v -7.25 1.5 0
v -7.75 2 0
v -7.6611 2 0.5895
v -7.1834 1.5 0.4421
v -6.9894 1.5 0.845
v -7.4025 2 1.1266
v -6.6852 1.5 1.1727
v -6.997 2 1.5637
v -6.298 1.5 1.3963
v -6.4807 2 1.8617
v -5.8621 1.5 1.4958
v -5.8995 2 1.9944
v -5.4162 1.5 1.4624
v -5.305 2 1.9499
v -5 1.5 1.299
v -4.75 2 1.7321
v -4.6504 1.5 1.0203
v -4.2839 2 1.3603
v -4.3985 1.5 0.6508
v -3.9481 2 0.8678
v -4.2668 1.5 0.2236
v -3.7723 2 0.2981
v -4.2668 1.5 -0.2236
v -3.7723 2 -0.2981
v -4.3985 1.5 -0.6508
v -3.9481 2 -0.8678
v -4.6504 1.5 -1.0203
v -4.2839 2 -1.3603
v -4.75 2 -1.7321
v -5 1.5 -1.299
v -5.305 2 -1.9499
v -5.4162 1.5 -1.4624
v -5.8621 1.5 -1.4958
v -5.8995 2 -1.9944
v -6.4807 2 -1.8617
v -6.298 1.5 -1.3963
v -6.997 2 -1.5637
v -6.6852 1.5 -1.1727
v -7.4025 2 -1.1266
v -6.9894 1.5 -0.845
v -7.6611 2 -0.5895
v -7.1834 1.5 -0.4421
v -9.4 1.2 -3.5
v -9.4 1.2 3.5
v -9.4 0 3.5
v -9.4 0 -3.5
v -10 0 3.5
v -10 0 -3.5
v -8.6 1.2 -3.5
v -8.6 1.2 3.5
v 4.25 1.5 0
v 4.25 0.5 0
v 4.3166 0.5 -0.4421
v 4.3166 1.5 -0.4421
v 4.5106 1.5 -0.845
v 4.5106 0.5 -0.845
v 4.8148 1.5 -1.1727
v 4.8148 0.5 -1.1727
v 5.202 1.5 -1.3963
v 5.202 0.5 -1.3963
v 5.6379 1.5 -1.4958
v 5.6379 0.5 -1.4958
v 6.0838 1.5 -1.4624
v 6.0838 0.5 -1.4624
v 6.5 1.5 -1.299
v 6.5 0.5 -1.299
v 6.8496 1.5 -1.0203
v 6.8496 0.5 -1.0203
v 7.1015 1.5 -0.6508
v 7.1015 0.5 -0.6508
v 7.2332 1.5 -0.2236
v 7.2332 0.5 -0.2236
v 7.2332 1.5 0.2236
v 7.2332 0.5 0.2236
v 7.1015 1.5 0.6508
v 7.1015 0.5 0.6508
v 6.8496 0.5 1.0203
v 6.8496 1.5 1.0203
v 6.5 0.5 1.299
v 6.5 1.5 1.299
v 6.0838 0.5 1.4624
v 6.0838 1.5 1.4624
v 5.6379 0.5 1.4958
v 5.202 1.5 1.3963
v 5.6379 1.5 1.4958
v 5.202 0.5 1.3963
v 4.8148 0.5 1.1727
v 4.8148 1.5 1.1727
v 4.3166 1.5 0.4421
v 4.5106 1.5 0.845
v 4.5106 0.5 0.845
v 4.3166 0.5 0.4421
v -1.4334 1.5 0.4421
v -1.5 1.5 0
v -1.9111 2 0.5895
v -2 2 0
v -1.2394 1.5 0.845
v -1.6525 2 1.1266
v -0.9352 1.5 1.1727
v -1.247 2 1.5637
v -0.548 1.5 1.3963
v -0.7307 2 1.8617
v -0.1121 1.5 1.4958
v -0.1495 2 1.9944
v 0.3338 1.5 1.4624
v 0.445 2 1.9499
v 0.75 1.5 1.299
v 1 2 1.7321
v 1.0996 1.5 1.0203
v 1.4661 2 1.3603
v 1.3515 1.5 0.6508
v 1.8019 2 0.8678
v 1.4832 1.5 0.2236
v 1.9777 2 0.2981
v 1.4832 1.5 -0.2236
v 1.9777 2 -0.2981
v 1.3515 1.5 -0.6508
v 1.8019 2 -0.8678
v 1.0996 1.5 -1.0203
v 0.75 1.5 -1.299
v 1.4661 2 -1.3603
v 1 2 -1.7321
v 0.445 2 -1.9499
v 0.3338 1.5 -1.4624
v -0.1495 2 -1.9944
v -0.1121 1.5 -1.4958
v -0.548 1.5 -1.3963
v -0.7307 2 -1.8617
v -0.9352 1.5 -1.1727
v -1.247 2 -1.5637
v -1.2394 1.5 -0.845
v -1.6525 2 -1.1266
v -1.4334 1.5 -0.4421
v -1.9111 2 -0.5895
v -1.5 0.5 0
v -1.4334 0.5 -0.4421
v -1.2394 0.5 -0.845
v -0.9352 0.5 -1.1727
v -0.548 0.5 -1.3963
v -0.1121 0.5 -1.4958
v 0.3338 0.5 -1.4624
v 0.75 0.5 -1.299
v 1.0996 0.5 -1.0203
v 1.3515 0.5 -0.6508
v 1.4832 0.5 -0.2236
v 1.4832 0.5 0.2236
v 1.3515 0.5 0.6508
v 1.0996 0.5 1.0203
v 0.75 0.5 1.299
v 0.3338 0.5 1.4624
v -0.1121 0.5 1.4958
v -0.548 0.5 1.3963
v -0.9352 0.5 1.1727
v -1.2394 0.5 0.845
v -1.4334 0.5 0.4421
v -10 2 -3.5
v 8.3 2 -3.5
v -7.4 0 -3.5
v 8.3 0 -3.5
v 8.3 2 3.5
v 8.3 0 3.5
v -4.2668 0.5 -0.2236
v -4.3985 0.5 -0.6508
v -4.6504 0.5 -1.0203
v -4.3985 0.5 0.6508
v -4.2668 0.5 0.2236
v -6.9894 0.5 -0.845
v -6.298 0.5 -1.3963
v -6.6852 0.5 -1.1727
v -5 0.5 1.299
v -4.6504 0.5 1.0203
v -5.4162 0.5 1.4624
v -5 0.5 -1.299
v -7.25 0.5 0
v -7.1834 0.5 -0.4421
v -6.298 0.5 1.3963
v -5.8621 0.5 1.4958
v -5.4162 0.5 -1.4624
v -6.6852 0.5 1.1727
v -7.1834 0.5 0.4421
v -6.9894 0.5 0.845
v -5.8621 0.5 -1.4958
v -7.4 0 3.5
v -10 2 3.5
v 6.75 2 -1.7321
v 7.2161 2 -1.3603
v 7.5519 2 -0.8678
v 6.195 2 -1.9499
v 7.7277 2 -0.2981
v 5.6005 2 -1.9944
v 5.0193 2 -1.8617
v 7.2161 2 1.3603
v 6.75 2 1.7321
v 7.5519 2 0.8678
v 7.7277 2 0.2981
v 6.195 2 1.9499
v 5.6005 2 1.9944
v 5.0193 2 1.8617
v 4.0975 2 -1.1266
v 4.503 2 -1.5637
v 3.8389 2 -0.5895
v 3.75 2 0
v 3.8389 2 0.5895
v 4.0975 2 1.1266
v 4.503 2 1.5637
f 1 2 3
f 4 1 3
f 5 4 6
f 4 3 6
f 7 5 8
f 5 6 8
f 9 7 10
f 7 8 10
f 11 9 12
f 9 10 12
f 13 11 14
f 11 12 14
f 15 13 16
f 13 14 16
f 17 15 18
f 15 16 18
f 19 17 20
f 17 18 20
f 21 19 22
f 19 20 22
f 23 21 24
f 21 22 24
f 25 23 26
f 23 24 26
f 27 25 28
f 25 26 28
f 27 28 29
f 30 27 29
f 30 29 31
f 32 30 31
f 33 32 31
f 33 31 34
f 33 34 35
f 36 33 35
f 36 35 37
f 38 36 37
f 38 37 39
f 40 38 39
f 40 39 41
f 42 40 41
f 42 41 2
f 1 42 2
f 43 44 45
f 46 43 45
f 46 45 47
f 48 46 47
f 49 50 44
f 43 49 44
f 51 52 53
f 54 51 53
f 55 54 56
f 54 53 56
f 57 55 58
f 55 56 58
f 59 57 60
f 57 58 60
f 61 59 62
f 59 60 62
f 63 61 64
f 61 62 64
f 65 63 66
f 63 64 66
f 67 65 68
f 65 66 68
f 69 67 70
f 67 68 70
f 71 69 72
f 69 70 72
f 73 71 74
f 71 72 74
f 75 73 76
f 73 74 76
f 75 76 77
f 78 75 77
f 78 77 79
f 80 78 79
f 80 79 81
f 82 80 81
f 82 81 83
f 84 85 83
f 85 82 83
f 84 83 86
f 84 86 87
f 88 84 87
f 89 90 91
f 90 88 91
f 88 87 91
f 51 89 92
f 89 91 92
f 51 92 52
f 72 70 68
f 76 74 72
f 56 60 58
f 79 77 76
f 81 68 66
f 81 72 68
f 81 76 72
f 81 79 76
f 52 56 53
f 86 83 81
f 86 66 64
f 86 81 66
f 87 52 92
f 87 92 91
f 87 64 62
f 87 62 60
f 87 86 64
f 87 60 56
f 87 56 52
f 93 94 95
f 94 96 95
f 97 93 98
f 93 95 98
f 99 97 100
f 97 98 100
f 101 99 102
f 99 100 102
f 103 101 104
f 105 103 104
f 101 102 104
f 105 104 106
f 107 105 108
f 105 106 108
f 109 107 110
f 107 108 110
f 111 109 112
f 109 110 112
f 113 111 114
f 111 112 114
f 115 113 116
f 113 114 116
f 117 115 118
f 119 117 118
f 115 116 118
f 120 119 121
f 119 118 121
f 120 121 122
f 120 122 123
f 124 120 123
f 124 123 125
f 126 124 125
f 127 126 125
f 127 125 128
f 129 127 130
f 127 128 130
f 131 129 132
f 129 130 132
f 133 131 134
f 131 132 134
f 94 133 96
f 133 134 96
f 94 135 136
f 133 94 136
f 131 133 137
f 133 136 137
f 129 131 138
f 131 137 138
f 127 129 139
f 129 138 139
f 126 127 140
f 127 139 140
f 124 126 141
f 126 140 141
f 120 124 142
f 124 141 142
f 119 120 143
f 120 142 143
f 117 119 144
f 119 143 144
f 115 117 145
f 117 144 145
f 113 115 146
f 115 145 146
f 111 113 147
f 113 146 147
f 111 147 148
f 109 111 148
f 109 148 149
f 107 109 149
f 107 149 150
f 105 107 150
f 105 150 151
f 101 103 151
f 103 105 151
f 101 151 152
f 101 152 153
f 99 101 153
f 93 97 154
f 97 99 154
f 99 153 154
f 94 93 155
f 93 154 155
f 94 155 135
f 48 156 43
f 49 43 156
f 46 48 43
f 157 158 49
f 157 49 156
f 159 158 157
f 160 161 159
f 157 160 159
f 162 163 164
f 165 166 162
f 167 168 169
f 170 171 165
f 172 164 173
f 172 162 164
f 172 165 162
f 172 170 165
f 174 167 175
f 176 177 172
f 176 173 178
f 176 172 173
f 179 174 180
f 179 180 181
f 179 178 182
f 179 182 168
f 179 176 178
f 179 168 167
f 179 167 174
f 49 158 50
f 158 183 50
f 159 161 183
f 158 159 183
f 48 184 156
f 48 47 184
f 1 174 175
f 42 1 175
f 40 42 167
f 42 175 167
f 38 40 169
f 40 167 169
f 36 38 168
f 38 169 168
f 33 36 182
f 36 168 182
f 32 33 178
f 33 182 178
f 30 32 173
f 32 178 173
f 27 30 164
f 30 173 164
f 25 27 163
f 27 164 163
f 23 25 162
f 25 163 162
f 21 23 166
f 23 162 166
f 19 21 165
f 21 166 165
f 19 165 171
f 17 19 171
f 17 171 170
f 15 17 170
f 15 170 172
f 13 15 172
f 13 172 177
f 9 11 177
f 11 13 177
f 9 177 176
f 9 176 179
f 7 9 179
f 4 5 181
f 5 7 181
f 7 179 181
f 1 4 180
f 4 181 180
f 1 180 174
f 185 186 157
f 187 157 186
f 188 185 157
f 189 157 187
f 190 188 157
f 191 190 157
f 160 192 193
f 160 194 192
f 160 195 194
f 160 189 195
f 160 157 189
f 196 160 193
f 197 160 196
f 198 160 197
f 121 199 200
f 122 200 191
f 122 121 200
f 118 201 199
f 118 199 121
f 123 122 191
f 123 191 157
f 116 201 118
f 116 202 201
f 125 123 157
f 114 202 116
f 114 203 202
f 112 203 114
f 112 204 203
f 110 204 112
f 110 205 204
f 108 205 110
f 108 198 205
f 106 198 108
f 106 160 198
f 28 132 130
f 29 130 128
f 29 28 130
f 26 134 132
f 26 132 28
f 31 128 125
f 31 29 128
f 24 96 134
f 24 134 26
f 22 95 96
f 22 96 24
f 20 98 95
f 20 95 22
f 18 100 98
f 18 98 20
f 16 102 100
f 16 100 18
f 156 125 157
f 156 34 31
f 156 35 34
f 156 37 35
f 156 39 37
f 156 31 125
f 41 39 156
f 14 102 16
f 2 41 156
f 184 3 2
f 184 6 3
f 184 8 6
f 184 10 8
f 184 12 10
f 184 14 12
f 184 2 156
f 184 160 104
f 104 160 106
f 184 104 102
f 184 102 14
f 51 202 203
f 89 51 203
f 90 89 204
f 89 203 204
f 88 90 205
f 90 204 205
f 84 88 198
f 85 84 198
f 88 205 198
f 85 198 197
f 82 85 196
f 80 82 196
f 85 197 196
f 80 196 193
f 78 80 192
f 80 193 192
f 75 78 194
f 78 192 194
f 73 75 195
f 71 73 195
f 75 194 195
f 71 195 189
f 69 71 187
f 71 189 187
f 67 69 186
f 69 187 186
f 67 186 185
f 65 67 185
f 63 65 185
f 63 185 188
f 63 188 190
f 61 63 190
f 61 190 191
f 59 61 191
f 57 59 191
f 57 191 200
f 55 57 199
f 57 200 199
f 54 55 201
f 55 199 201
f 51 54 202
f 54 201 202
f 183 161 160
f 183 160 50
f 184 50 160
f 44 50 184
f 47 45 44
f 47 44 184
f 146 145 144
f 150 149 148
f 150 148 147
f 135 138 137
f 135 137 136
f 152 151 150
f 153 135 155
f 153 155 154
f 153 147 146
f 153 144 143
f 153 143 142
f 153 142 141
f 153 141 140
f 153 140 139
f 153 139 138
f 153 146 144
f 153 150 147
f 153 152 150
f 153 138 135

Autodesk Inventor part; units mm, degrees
ref_plane "YZ Plane" through (0, 0, 0) normal (1, 0, 0) x (0, 1, 0)
ref_plane "XZ Plane" through (0, 0, 0) normal (0, 1, 0) x (-1, 0, 0)
ref_plane "XY Plane" through (0, 0, 0) normal (0, 0, 1) x (1, 0, 0)
sketch "Sketch1" plane through (0, 0, 0) normal (0, 1, 0) x (-1, 0, 0)
  line L0 (-10, 3.5) -> (10, 3.5)
  line L1 (10, 3.5) -> (10, -3.5)
  line L2 (10, -3.5) -> (-10, -3.5)
  line L3 (-10, -3.5) -> (-10, 3.5)
  line L4 (-10, 3.5) -> (10, -3.5) construction
  line L5 (10, 3.5) -> (-10, -3.5) construction
  line L6 (-10, 0) -> (10, 0) construction
  circle A0 centre (-5.75, 0) radius 1.5
  circle A1 centre (5.75, 0) radius 1.5
  circle A2 centre (0, 0) radius 1.5
  line L7 (-8.3, 3.5) -> (-8.3, -3.5)
  point P0 (0, 0)
  dimension "d0" = 7
  dimension "d1" = 20
  dimension "d2" = 3
  dimension "d3" = 3
  dimension "d4" = 3
  dimension "d5" = 5.75
  dimension "d6" = 5.75
  dimension "d7" = 4.25
  dimension "d8" = 4.25
  dimension "d16" = 1.7
extrude "Extrusion1" add sketch "Sketch1" along normal blind 2 contours L0 L1 L2 L7
extrude "Extrusion2" add sketch "Sketch1" along normal blind 0.5 contours A0 | A1 | A2
chamfer "Chamfer1" distance 0.5 angle 45 3 edges at (7.25, 2, 0) (1.5, 2, 0) (-4.25, 2, 0)
sketch "Sketch2" plane through (-10, 0, 3.5) normal (0, 0, 1) x (1, 0, 0)
  line L0 (0, 0) -> (18.3, 0) projected
  line L1 (18.3, 0) -> (18.3, 2) projected
  line L2 (0, 2) -> (18.3, 2) projected
  line L3 (0, 0) -> (0, 2) projected
  line L4 (2.75, 1.5) -> (5.75, 1.5) projected
  line L5 (6.25, 2) -> (2.25, 2) projected
  line L6 (2.75, 1.5) -> (2.25, 2)
  line L7 (2.6, 0) -> (1.4, 1.2)
  line L8 (0.6, 1.2) -> (0.6, 0)
  line L9 (2.75, 0.5) -> (5.75, 0.5) projected
  line L10 (2.75, 1.5) -> (2.75, 0.5)
  line L11 (2.75, 1.5) -> (2.75, 0.5) projected
  line L12 (5.75, 0.5) -> (5.75, 1.5)
  line L13 (5.75, 1.5) -> (6.25, 2)
  line L14 (1.4, 1.2) -> (0.6, 1.2)
  point P0 (10, 0)
  dimension "d17" = 0.6
  dimension "d18" = 90
  dimension "d19" = 45
  dimension "d21" = 0.8
  dimension "d22" = 1.2
  dimension "d23" = 0.4596
extrude "Extrusion3" cut sketch "Sketch2" against normal through all contours L8 L14 L7 L0
equation "\"d6\" = d5"
equation "\"d7\" = d5 - 0.5 * d3"
equation "\"d8\" = d5 - 0.5 * d2"
properties part number "glue_test_flex_2"
